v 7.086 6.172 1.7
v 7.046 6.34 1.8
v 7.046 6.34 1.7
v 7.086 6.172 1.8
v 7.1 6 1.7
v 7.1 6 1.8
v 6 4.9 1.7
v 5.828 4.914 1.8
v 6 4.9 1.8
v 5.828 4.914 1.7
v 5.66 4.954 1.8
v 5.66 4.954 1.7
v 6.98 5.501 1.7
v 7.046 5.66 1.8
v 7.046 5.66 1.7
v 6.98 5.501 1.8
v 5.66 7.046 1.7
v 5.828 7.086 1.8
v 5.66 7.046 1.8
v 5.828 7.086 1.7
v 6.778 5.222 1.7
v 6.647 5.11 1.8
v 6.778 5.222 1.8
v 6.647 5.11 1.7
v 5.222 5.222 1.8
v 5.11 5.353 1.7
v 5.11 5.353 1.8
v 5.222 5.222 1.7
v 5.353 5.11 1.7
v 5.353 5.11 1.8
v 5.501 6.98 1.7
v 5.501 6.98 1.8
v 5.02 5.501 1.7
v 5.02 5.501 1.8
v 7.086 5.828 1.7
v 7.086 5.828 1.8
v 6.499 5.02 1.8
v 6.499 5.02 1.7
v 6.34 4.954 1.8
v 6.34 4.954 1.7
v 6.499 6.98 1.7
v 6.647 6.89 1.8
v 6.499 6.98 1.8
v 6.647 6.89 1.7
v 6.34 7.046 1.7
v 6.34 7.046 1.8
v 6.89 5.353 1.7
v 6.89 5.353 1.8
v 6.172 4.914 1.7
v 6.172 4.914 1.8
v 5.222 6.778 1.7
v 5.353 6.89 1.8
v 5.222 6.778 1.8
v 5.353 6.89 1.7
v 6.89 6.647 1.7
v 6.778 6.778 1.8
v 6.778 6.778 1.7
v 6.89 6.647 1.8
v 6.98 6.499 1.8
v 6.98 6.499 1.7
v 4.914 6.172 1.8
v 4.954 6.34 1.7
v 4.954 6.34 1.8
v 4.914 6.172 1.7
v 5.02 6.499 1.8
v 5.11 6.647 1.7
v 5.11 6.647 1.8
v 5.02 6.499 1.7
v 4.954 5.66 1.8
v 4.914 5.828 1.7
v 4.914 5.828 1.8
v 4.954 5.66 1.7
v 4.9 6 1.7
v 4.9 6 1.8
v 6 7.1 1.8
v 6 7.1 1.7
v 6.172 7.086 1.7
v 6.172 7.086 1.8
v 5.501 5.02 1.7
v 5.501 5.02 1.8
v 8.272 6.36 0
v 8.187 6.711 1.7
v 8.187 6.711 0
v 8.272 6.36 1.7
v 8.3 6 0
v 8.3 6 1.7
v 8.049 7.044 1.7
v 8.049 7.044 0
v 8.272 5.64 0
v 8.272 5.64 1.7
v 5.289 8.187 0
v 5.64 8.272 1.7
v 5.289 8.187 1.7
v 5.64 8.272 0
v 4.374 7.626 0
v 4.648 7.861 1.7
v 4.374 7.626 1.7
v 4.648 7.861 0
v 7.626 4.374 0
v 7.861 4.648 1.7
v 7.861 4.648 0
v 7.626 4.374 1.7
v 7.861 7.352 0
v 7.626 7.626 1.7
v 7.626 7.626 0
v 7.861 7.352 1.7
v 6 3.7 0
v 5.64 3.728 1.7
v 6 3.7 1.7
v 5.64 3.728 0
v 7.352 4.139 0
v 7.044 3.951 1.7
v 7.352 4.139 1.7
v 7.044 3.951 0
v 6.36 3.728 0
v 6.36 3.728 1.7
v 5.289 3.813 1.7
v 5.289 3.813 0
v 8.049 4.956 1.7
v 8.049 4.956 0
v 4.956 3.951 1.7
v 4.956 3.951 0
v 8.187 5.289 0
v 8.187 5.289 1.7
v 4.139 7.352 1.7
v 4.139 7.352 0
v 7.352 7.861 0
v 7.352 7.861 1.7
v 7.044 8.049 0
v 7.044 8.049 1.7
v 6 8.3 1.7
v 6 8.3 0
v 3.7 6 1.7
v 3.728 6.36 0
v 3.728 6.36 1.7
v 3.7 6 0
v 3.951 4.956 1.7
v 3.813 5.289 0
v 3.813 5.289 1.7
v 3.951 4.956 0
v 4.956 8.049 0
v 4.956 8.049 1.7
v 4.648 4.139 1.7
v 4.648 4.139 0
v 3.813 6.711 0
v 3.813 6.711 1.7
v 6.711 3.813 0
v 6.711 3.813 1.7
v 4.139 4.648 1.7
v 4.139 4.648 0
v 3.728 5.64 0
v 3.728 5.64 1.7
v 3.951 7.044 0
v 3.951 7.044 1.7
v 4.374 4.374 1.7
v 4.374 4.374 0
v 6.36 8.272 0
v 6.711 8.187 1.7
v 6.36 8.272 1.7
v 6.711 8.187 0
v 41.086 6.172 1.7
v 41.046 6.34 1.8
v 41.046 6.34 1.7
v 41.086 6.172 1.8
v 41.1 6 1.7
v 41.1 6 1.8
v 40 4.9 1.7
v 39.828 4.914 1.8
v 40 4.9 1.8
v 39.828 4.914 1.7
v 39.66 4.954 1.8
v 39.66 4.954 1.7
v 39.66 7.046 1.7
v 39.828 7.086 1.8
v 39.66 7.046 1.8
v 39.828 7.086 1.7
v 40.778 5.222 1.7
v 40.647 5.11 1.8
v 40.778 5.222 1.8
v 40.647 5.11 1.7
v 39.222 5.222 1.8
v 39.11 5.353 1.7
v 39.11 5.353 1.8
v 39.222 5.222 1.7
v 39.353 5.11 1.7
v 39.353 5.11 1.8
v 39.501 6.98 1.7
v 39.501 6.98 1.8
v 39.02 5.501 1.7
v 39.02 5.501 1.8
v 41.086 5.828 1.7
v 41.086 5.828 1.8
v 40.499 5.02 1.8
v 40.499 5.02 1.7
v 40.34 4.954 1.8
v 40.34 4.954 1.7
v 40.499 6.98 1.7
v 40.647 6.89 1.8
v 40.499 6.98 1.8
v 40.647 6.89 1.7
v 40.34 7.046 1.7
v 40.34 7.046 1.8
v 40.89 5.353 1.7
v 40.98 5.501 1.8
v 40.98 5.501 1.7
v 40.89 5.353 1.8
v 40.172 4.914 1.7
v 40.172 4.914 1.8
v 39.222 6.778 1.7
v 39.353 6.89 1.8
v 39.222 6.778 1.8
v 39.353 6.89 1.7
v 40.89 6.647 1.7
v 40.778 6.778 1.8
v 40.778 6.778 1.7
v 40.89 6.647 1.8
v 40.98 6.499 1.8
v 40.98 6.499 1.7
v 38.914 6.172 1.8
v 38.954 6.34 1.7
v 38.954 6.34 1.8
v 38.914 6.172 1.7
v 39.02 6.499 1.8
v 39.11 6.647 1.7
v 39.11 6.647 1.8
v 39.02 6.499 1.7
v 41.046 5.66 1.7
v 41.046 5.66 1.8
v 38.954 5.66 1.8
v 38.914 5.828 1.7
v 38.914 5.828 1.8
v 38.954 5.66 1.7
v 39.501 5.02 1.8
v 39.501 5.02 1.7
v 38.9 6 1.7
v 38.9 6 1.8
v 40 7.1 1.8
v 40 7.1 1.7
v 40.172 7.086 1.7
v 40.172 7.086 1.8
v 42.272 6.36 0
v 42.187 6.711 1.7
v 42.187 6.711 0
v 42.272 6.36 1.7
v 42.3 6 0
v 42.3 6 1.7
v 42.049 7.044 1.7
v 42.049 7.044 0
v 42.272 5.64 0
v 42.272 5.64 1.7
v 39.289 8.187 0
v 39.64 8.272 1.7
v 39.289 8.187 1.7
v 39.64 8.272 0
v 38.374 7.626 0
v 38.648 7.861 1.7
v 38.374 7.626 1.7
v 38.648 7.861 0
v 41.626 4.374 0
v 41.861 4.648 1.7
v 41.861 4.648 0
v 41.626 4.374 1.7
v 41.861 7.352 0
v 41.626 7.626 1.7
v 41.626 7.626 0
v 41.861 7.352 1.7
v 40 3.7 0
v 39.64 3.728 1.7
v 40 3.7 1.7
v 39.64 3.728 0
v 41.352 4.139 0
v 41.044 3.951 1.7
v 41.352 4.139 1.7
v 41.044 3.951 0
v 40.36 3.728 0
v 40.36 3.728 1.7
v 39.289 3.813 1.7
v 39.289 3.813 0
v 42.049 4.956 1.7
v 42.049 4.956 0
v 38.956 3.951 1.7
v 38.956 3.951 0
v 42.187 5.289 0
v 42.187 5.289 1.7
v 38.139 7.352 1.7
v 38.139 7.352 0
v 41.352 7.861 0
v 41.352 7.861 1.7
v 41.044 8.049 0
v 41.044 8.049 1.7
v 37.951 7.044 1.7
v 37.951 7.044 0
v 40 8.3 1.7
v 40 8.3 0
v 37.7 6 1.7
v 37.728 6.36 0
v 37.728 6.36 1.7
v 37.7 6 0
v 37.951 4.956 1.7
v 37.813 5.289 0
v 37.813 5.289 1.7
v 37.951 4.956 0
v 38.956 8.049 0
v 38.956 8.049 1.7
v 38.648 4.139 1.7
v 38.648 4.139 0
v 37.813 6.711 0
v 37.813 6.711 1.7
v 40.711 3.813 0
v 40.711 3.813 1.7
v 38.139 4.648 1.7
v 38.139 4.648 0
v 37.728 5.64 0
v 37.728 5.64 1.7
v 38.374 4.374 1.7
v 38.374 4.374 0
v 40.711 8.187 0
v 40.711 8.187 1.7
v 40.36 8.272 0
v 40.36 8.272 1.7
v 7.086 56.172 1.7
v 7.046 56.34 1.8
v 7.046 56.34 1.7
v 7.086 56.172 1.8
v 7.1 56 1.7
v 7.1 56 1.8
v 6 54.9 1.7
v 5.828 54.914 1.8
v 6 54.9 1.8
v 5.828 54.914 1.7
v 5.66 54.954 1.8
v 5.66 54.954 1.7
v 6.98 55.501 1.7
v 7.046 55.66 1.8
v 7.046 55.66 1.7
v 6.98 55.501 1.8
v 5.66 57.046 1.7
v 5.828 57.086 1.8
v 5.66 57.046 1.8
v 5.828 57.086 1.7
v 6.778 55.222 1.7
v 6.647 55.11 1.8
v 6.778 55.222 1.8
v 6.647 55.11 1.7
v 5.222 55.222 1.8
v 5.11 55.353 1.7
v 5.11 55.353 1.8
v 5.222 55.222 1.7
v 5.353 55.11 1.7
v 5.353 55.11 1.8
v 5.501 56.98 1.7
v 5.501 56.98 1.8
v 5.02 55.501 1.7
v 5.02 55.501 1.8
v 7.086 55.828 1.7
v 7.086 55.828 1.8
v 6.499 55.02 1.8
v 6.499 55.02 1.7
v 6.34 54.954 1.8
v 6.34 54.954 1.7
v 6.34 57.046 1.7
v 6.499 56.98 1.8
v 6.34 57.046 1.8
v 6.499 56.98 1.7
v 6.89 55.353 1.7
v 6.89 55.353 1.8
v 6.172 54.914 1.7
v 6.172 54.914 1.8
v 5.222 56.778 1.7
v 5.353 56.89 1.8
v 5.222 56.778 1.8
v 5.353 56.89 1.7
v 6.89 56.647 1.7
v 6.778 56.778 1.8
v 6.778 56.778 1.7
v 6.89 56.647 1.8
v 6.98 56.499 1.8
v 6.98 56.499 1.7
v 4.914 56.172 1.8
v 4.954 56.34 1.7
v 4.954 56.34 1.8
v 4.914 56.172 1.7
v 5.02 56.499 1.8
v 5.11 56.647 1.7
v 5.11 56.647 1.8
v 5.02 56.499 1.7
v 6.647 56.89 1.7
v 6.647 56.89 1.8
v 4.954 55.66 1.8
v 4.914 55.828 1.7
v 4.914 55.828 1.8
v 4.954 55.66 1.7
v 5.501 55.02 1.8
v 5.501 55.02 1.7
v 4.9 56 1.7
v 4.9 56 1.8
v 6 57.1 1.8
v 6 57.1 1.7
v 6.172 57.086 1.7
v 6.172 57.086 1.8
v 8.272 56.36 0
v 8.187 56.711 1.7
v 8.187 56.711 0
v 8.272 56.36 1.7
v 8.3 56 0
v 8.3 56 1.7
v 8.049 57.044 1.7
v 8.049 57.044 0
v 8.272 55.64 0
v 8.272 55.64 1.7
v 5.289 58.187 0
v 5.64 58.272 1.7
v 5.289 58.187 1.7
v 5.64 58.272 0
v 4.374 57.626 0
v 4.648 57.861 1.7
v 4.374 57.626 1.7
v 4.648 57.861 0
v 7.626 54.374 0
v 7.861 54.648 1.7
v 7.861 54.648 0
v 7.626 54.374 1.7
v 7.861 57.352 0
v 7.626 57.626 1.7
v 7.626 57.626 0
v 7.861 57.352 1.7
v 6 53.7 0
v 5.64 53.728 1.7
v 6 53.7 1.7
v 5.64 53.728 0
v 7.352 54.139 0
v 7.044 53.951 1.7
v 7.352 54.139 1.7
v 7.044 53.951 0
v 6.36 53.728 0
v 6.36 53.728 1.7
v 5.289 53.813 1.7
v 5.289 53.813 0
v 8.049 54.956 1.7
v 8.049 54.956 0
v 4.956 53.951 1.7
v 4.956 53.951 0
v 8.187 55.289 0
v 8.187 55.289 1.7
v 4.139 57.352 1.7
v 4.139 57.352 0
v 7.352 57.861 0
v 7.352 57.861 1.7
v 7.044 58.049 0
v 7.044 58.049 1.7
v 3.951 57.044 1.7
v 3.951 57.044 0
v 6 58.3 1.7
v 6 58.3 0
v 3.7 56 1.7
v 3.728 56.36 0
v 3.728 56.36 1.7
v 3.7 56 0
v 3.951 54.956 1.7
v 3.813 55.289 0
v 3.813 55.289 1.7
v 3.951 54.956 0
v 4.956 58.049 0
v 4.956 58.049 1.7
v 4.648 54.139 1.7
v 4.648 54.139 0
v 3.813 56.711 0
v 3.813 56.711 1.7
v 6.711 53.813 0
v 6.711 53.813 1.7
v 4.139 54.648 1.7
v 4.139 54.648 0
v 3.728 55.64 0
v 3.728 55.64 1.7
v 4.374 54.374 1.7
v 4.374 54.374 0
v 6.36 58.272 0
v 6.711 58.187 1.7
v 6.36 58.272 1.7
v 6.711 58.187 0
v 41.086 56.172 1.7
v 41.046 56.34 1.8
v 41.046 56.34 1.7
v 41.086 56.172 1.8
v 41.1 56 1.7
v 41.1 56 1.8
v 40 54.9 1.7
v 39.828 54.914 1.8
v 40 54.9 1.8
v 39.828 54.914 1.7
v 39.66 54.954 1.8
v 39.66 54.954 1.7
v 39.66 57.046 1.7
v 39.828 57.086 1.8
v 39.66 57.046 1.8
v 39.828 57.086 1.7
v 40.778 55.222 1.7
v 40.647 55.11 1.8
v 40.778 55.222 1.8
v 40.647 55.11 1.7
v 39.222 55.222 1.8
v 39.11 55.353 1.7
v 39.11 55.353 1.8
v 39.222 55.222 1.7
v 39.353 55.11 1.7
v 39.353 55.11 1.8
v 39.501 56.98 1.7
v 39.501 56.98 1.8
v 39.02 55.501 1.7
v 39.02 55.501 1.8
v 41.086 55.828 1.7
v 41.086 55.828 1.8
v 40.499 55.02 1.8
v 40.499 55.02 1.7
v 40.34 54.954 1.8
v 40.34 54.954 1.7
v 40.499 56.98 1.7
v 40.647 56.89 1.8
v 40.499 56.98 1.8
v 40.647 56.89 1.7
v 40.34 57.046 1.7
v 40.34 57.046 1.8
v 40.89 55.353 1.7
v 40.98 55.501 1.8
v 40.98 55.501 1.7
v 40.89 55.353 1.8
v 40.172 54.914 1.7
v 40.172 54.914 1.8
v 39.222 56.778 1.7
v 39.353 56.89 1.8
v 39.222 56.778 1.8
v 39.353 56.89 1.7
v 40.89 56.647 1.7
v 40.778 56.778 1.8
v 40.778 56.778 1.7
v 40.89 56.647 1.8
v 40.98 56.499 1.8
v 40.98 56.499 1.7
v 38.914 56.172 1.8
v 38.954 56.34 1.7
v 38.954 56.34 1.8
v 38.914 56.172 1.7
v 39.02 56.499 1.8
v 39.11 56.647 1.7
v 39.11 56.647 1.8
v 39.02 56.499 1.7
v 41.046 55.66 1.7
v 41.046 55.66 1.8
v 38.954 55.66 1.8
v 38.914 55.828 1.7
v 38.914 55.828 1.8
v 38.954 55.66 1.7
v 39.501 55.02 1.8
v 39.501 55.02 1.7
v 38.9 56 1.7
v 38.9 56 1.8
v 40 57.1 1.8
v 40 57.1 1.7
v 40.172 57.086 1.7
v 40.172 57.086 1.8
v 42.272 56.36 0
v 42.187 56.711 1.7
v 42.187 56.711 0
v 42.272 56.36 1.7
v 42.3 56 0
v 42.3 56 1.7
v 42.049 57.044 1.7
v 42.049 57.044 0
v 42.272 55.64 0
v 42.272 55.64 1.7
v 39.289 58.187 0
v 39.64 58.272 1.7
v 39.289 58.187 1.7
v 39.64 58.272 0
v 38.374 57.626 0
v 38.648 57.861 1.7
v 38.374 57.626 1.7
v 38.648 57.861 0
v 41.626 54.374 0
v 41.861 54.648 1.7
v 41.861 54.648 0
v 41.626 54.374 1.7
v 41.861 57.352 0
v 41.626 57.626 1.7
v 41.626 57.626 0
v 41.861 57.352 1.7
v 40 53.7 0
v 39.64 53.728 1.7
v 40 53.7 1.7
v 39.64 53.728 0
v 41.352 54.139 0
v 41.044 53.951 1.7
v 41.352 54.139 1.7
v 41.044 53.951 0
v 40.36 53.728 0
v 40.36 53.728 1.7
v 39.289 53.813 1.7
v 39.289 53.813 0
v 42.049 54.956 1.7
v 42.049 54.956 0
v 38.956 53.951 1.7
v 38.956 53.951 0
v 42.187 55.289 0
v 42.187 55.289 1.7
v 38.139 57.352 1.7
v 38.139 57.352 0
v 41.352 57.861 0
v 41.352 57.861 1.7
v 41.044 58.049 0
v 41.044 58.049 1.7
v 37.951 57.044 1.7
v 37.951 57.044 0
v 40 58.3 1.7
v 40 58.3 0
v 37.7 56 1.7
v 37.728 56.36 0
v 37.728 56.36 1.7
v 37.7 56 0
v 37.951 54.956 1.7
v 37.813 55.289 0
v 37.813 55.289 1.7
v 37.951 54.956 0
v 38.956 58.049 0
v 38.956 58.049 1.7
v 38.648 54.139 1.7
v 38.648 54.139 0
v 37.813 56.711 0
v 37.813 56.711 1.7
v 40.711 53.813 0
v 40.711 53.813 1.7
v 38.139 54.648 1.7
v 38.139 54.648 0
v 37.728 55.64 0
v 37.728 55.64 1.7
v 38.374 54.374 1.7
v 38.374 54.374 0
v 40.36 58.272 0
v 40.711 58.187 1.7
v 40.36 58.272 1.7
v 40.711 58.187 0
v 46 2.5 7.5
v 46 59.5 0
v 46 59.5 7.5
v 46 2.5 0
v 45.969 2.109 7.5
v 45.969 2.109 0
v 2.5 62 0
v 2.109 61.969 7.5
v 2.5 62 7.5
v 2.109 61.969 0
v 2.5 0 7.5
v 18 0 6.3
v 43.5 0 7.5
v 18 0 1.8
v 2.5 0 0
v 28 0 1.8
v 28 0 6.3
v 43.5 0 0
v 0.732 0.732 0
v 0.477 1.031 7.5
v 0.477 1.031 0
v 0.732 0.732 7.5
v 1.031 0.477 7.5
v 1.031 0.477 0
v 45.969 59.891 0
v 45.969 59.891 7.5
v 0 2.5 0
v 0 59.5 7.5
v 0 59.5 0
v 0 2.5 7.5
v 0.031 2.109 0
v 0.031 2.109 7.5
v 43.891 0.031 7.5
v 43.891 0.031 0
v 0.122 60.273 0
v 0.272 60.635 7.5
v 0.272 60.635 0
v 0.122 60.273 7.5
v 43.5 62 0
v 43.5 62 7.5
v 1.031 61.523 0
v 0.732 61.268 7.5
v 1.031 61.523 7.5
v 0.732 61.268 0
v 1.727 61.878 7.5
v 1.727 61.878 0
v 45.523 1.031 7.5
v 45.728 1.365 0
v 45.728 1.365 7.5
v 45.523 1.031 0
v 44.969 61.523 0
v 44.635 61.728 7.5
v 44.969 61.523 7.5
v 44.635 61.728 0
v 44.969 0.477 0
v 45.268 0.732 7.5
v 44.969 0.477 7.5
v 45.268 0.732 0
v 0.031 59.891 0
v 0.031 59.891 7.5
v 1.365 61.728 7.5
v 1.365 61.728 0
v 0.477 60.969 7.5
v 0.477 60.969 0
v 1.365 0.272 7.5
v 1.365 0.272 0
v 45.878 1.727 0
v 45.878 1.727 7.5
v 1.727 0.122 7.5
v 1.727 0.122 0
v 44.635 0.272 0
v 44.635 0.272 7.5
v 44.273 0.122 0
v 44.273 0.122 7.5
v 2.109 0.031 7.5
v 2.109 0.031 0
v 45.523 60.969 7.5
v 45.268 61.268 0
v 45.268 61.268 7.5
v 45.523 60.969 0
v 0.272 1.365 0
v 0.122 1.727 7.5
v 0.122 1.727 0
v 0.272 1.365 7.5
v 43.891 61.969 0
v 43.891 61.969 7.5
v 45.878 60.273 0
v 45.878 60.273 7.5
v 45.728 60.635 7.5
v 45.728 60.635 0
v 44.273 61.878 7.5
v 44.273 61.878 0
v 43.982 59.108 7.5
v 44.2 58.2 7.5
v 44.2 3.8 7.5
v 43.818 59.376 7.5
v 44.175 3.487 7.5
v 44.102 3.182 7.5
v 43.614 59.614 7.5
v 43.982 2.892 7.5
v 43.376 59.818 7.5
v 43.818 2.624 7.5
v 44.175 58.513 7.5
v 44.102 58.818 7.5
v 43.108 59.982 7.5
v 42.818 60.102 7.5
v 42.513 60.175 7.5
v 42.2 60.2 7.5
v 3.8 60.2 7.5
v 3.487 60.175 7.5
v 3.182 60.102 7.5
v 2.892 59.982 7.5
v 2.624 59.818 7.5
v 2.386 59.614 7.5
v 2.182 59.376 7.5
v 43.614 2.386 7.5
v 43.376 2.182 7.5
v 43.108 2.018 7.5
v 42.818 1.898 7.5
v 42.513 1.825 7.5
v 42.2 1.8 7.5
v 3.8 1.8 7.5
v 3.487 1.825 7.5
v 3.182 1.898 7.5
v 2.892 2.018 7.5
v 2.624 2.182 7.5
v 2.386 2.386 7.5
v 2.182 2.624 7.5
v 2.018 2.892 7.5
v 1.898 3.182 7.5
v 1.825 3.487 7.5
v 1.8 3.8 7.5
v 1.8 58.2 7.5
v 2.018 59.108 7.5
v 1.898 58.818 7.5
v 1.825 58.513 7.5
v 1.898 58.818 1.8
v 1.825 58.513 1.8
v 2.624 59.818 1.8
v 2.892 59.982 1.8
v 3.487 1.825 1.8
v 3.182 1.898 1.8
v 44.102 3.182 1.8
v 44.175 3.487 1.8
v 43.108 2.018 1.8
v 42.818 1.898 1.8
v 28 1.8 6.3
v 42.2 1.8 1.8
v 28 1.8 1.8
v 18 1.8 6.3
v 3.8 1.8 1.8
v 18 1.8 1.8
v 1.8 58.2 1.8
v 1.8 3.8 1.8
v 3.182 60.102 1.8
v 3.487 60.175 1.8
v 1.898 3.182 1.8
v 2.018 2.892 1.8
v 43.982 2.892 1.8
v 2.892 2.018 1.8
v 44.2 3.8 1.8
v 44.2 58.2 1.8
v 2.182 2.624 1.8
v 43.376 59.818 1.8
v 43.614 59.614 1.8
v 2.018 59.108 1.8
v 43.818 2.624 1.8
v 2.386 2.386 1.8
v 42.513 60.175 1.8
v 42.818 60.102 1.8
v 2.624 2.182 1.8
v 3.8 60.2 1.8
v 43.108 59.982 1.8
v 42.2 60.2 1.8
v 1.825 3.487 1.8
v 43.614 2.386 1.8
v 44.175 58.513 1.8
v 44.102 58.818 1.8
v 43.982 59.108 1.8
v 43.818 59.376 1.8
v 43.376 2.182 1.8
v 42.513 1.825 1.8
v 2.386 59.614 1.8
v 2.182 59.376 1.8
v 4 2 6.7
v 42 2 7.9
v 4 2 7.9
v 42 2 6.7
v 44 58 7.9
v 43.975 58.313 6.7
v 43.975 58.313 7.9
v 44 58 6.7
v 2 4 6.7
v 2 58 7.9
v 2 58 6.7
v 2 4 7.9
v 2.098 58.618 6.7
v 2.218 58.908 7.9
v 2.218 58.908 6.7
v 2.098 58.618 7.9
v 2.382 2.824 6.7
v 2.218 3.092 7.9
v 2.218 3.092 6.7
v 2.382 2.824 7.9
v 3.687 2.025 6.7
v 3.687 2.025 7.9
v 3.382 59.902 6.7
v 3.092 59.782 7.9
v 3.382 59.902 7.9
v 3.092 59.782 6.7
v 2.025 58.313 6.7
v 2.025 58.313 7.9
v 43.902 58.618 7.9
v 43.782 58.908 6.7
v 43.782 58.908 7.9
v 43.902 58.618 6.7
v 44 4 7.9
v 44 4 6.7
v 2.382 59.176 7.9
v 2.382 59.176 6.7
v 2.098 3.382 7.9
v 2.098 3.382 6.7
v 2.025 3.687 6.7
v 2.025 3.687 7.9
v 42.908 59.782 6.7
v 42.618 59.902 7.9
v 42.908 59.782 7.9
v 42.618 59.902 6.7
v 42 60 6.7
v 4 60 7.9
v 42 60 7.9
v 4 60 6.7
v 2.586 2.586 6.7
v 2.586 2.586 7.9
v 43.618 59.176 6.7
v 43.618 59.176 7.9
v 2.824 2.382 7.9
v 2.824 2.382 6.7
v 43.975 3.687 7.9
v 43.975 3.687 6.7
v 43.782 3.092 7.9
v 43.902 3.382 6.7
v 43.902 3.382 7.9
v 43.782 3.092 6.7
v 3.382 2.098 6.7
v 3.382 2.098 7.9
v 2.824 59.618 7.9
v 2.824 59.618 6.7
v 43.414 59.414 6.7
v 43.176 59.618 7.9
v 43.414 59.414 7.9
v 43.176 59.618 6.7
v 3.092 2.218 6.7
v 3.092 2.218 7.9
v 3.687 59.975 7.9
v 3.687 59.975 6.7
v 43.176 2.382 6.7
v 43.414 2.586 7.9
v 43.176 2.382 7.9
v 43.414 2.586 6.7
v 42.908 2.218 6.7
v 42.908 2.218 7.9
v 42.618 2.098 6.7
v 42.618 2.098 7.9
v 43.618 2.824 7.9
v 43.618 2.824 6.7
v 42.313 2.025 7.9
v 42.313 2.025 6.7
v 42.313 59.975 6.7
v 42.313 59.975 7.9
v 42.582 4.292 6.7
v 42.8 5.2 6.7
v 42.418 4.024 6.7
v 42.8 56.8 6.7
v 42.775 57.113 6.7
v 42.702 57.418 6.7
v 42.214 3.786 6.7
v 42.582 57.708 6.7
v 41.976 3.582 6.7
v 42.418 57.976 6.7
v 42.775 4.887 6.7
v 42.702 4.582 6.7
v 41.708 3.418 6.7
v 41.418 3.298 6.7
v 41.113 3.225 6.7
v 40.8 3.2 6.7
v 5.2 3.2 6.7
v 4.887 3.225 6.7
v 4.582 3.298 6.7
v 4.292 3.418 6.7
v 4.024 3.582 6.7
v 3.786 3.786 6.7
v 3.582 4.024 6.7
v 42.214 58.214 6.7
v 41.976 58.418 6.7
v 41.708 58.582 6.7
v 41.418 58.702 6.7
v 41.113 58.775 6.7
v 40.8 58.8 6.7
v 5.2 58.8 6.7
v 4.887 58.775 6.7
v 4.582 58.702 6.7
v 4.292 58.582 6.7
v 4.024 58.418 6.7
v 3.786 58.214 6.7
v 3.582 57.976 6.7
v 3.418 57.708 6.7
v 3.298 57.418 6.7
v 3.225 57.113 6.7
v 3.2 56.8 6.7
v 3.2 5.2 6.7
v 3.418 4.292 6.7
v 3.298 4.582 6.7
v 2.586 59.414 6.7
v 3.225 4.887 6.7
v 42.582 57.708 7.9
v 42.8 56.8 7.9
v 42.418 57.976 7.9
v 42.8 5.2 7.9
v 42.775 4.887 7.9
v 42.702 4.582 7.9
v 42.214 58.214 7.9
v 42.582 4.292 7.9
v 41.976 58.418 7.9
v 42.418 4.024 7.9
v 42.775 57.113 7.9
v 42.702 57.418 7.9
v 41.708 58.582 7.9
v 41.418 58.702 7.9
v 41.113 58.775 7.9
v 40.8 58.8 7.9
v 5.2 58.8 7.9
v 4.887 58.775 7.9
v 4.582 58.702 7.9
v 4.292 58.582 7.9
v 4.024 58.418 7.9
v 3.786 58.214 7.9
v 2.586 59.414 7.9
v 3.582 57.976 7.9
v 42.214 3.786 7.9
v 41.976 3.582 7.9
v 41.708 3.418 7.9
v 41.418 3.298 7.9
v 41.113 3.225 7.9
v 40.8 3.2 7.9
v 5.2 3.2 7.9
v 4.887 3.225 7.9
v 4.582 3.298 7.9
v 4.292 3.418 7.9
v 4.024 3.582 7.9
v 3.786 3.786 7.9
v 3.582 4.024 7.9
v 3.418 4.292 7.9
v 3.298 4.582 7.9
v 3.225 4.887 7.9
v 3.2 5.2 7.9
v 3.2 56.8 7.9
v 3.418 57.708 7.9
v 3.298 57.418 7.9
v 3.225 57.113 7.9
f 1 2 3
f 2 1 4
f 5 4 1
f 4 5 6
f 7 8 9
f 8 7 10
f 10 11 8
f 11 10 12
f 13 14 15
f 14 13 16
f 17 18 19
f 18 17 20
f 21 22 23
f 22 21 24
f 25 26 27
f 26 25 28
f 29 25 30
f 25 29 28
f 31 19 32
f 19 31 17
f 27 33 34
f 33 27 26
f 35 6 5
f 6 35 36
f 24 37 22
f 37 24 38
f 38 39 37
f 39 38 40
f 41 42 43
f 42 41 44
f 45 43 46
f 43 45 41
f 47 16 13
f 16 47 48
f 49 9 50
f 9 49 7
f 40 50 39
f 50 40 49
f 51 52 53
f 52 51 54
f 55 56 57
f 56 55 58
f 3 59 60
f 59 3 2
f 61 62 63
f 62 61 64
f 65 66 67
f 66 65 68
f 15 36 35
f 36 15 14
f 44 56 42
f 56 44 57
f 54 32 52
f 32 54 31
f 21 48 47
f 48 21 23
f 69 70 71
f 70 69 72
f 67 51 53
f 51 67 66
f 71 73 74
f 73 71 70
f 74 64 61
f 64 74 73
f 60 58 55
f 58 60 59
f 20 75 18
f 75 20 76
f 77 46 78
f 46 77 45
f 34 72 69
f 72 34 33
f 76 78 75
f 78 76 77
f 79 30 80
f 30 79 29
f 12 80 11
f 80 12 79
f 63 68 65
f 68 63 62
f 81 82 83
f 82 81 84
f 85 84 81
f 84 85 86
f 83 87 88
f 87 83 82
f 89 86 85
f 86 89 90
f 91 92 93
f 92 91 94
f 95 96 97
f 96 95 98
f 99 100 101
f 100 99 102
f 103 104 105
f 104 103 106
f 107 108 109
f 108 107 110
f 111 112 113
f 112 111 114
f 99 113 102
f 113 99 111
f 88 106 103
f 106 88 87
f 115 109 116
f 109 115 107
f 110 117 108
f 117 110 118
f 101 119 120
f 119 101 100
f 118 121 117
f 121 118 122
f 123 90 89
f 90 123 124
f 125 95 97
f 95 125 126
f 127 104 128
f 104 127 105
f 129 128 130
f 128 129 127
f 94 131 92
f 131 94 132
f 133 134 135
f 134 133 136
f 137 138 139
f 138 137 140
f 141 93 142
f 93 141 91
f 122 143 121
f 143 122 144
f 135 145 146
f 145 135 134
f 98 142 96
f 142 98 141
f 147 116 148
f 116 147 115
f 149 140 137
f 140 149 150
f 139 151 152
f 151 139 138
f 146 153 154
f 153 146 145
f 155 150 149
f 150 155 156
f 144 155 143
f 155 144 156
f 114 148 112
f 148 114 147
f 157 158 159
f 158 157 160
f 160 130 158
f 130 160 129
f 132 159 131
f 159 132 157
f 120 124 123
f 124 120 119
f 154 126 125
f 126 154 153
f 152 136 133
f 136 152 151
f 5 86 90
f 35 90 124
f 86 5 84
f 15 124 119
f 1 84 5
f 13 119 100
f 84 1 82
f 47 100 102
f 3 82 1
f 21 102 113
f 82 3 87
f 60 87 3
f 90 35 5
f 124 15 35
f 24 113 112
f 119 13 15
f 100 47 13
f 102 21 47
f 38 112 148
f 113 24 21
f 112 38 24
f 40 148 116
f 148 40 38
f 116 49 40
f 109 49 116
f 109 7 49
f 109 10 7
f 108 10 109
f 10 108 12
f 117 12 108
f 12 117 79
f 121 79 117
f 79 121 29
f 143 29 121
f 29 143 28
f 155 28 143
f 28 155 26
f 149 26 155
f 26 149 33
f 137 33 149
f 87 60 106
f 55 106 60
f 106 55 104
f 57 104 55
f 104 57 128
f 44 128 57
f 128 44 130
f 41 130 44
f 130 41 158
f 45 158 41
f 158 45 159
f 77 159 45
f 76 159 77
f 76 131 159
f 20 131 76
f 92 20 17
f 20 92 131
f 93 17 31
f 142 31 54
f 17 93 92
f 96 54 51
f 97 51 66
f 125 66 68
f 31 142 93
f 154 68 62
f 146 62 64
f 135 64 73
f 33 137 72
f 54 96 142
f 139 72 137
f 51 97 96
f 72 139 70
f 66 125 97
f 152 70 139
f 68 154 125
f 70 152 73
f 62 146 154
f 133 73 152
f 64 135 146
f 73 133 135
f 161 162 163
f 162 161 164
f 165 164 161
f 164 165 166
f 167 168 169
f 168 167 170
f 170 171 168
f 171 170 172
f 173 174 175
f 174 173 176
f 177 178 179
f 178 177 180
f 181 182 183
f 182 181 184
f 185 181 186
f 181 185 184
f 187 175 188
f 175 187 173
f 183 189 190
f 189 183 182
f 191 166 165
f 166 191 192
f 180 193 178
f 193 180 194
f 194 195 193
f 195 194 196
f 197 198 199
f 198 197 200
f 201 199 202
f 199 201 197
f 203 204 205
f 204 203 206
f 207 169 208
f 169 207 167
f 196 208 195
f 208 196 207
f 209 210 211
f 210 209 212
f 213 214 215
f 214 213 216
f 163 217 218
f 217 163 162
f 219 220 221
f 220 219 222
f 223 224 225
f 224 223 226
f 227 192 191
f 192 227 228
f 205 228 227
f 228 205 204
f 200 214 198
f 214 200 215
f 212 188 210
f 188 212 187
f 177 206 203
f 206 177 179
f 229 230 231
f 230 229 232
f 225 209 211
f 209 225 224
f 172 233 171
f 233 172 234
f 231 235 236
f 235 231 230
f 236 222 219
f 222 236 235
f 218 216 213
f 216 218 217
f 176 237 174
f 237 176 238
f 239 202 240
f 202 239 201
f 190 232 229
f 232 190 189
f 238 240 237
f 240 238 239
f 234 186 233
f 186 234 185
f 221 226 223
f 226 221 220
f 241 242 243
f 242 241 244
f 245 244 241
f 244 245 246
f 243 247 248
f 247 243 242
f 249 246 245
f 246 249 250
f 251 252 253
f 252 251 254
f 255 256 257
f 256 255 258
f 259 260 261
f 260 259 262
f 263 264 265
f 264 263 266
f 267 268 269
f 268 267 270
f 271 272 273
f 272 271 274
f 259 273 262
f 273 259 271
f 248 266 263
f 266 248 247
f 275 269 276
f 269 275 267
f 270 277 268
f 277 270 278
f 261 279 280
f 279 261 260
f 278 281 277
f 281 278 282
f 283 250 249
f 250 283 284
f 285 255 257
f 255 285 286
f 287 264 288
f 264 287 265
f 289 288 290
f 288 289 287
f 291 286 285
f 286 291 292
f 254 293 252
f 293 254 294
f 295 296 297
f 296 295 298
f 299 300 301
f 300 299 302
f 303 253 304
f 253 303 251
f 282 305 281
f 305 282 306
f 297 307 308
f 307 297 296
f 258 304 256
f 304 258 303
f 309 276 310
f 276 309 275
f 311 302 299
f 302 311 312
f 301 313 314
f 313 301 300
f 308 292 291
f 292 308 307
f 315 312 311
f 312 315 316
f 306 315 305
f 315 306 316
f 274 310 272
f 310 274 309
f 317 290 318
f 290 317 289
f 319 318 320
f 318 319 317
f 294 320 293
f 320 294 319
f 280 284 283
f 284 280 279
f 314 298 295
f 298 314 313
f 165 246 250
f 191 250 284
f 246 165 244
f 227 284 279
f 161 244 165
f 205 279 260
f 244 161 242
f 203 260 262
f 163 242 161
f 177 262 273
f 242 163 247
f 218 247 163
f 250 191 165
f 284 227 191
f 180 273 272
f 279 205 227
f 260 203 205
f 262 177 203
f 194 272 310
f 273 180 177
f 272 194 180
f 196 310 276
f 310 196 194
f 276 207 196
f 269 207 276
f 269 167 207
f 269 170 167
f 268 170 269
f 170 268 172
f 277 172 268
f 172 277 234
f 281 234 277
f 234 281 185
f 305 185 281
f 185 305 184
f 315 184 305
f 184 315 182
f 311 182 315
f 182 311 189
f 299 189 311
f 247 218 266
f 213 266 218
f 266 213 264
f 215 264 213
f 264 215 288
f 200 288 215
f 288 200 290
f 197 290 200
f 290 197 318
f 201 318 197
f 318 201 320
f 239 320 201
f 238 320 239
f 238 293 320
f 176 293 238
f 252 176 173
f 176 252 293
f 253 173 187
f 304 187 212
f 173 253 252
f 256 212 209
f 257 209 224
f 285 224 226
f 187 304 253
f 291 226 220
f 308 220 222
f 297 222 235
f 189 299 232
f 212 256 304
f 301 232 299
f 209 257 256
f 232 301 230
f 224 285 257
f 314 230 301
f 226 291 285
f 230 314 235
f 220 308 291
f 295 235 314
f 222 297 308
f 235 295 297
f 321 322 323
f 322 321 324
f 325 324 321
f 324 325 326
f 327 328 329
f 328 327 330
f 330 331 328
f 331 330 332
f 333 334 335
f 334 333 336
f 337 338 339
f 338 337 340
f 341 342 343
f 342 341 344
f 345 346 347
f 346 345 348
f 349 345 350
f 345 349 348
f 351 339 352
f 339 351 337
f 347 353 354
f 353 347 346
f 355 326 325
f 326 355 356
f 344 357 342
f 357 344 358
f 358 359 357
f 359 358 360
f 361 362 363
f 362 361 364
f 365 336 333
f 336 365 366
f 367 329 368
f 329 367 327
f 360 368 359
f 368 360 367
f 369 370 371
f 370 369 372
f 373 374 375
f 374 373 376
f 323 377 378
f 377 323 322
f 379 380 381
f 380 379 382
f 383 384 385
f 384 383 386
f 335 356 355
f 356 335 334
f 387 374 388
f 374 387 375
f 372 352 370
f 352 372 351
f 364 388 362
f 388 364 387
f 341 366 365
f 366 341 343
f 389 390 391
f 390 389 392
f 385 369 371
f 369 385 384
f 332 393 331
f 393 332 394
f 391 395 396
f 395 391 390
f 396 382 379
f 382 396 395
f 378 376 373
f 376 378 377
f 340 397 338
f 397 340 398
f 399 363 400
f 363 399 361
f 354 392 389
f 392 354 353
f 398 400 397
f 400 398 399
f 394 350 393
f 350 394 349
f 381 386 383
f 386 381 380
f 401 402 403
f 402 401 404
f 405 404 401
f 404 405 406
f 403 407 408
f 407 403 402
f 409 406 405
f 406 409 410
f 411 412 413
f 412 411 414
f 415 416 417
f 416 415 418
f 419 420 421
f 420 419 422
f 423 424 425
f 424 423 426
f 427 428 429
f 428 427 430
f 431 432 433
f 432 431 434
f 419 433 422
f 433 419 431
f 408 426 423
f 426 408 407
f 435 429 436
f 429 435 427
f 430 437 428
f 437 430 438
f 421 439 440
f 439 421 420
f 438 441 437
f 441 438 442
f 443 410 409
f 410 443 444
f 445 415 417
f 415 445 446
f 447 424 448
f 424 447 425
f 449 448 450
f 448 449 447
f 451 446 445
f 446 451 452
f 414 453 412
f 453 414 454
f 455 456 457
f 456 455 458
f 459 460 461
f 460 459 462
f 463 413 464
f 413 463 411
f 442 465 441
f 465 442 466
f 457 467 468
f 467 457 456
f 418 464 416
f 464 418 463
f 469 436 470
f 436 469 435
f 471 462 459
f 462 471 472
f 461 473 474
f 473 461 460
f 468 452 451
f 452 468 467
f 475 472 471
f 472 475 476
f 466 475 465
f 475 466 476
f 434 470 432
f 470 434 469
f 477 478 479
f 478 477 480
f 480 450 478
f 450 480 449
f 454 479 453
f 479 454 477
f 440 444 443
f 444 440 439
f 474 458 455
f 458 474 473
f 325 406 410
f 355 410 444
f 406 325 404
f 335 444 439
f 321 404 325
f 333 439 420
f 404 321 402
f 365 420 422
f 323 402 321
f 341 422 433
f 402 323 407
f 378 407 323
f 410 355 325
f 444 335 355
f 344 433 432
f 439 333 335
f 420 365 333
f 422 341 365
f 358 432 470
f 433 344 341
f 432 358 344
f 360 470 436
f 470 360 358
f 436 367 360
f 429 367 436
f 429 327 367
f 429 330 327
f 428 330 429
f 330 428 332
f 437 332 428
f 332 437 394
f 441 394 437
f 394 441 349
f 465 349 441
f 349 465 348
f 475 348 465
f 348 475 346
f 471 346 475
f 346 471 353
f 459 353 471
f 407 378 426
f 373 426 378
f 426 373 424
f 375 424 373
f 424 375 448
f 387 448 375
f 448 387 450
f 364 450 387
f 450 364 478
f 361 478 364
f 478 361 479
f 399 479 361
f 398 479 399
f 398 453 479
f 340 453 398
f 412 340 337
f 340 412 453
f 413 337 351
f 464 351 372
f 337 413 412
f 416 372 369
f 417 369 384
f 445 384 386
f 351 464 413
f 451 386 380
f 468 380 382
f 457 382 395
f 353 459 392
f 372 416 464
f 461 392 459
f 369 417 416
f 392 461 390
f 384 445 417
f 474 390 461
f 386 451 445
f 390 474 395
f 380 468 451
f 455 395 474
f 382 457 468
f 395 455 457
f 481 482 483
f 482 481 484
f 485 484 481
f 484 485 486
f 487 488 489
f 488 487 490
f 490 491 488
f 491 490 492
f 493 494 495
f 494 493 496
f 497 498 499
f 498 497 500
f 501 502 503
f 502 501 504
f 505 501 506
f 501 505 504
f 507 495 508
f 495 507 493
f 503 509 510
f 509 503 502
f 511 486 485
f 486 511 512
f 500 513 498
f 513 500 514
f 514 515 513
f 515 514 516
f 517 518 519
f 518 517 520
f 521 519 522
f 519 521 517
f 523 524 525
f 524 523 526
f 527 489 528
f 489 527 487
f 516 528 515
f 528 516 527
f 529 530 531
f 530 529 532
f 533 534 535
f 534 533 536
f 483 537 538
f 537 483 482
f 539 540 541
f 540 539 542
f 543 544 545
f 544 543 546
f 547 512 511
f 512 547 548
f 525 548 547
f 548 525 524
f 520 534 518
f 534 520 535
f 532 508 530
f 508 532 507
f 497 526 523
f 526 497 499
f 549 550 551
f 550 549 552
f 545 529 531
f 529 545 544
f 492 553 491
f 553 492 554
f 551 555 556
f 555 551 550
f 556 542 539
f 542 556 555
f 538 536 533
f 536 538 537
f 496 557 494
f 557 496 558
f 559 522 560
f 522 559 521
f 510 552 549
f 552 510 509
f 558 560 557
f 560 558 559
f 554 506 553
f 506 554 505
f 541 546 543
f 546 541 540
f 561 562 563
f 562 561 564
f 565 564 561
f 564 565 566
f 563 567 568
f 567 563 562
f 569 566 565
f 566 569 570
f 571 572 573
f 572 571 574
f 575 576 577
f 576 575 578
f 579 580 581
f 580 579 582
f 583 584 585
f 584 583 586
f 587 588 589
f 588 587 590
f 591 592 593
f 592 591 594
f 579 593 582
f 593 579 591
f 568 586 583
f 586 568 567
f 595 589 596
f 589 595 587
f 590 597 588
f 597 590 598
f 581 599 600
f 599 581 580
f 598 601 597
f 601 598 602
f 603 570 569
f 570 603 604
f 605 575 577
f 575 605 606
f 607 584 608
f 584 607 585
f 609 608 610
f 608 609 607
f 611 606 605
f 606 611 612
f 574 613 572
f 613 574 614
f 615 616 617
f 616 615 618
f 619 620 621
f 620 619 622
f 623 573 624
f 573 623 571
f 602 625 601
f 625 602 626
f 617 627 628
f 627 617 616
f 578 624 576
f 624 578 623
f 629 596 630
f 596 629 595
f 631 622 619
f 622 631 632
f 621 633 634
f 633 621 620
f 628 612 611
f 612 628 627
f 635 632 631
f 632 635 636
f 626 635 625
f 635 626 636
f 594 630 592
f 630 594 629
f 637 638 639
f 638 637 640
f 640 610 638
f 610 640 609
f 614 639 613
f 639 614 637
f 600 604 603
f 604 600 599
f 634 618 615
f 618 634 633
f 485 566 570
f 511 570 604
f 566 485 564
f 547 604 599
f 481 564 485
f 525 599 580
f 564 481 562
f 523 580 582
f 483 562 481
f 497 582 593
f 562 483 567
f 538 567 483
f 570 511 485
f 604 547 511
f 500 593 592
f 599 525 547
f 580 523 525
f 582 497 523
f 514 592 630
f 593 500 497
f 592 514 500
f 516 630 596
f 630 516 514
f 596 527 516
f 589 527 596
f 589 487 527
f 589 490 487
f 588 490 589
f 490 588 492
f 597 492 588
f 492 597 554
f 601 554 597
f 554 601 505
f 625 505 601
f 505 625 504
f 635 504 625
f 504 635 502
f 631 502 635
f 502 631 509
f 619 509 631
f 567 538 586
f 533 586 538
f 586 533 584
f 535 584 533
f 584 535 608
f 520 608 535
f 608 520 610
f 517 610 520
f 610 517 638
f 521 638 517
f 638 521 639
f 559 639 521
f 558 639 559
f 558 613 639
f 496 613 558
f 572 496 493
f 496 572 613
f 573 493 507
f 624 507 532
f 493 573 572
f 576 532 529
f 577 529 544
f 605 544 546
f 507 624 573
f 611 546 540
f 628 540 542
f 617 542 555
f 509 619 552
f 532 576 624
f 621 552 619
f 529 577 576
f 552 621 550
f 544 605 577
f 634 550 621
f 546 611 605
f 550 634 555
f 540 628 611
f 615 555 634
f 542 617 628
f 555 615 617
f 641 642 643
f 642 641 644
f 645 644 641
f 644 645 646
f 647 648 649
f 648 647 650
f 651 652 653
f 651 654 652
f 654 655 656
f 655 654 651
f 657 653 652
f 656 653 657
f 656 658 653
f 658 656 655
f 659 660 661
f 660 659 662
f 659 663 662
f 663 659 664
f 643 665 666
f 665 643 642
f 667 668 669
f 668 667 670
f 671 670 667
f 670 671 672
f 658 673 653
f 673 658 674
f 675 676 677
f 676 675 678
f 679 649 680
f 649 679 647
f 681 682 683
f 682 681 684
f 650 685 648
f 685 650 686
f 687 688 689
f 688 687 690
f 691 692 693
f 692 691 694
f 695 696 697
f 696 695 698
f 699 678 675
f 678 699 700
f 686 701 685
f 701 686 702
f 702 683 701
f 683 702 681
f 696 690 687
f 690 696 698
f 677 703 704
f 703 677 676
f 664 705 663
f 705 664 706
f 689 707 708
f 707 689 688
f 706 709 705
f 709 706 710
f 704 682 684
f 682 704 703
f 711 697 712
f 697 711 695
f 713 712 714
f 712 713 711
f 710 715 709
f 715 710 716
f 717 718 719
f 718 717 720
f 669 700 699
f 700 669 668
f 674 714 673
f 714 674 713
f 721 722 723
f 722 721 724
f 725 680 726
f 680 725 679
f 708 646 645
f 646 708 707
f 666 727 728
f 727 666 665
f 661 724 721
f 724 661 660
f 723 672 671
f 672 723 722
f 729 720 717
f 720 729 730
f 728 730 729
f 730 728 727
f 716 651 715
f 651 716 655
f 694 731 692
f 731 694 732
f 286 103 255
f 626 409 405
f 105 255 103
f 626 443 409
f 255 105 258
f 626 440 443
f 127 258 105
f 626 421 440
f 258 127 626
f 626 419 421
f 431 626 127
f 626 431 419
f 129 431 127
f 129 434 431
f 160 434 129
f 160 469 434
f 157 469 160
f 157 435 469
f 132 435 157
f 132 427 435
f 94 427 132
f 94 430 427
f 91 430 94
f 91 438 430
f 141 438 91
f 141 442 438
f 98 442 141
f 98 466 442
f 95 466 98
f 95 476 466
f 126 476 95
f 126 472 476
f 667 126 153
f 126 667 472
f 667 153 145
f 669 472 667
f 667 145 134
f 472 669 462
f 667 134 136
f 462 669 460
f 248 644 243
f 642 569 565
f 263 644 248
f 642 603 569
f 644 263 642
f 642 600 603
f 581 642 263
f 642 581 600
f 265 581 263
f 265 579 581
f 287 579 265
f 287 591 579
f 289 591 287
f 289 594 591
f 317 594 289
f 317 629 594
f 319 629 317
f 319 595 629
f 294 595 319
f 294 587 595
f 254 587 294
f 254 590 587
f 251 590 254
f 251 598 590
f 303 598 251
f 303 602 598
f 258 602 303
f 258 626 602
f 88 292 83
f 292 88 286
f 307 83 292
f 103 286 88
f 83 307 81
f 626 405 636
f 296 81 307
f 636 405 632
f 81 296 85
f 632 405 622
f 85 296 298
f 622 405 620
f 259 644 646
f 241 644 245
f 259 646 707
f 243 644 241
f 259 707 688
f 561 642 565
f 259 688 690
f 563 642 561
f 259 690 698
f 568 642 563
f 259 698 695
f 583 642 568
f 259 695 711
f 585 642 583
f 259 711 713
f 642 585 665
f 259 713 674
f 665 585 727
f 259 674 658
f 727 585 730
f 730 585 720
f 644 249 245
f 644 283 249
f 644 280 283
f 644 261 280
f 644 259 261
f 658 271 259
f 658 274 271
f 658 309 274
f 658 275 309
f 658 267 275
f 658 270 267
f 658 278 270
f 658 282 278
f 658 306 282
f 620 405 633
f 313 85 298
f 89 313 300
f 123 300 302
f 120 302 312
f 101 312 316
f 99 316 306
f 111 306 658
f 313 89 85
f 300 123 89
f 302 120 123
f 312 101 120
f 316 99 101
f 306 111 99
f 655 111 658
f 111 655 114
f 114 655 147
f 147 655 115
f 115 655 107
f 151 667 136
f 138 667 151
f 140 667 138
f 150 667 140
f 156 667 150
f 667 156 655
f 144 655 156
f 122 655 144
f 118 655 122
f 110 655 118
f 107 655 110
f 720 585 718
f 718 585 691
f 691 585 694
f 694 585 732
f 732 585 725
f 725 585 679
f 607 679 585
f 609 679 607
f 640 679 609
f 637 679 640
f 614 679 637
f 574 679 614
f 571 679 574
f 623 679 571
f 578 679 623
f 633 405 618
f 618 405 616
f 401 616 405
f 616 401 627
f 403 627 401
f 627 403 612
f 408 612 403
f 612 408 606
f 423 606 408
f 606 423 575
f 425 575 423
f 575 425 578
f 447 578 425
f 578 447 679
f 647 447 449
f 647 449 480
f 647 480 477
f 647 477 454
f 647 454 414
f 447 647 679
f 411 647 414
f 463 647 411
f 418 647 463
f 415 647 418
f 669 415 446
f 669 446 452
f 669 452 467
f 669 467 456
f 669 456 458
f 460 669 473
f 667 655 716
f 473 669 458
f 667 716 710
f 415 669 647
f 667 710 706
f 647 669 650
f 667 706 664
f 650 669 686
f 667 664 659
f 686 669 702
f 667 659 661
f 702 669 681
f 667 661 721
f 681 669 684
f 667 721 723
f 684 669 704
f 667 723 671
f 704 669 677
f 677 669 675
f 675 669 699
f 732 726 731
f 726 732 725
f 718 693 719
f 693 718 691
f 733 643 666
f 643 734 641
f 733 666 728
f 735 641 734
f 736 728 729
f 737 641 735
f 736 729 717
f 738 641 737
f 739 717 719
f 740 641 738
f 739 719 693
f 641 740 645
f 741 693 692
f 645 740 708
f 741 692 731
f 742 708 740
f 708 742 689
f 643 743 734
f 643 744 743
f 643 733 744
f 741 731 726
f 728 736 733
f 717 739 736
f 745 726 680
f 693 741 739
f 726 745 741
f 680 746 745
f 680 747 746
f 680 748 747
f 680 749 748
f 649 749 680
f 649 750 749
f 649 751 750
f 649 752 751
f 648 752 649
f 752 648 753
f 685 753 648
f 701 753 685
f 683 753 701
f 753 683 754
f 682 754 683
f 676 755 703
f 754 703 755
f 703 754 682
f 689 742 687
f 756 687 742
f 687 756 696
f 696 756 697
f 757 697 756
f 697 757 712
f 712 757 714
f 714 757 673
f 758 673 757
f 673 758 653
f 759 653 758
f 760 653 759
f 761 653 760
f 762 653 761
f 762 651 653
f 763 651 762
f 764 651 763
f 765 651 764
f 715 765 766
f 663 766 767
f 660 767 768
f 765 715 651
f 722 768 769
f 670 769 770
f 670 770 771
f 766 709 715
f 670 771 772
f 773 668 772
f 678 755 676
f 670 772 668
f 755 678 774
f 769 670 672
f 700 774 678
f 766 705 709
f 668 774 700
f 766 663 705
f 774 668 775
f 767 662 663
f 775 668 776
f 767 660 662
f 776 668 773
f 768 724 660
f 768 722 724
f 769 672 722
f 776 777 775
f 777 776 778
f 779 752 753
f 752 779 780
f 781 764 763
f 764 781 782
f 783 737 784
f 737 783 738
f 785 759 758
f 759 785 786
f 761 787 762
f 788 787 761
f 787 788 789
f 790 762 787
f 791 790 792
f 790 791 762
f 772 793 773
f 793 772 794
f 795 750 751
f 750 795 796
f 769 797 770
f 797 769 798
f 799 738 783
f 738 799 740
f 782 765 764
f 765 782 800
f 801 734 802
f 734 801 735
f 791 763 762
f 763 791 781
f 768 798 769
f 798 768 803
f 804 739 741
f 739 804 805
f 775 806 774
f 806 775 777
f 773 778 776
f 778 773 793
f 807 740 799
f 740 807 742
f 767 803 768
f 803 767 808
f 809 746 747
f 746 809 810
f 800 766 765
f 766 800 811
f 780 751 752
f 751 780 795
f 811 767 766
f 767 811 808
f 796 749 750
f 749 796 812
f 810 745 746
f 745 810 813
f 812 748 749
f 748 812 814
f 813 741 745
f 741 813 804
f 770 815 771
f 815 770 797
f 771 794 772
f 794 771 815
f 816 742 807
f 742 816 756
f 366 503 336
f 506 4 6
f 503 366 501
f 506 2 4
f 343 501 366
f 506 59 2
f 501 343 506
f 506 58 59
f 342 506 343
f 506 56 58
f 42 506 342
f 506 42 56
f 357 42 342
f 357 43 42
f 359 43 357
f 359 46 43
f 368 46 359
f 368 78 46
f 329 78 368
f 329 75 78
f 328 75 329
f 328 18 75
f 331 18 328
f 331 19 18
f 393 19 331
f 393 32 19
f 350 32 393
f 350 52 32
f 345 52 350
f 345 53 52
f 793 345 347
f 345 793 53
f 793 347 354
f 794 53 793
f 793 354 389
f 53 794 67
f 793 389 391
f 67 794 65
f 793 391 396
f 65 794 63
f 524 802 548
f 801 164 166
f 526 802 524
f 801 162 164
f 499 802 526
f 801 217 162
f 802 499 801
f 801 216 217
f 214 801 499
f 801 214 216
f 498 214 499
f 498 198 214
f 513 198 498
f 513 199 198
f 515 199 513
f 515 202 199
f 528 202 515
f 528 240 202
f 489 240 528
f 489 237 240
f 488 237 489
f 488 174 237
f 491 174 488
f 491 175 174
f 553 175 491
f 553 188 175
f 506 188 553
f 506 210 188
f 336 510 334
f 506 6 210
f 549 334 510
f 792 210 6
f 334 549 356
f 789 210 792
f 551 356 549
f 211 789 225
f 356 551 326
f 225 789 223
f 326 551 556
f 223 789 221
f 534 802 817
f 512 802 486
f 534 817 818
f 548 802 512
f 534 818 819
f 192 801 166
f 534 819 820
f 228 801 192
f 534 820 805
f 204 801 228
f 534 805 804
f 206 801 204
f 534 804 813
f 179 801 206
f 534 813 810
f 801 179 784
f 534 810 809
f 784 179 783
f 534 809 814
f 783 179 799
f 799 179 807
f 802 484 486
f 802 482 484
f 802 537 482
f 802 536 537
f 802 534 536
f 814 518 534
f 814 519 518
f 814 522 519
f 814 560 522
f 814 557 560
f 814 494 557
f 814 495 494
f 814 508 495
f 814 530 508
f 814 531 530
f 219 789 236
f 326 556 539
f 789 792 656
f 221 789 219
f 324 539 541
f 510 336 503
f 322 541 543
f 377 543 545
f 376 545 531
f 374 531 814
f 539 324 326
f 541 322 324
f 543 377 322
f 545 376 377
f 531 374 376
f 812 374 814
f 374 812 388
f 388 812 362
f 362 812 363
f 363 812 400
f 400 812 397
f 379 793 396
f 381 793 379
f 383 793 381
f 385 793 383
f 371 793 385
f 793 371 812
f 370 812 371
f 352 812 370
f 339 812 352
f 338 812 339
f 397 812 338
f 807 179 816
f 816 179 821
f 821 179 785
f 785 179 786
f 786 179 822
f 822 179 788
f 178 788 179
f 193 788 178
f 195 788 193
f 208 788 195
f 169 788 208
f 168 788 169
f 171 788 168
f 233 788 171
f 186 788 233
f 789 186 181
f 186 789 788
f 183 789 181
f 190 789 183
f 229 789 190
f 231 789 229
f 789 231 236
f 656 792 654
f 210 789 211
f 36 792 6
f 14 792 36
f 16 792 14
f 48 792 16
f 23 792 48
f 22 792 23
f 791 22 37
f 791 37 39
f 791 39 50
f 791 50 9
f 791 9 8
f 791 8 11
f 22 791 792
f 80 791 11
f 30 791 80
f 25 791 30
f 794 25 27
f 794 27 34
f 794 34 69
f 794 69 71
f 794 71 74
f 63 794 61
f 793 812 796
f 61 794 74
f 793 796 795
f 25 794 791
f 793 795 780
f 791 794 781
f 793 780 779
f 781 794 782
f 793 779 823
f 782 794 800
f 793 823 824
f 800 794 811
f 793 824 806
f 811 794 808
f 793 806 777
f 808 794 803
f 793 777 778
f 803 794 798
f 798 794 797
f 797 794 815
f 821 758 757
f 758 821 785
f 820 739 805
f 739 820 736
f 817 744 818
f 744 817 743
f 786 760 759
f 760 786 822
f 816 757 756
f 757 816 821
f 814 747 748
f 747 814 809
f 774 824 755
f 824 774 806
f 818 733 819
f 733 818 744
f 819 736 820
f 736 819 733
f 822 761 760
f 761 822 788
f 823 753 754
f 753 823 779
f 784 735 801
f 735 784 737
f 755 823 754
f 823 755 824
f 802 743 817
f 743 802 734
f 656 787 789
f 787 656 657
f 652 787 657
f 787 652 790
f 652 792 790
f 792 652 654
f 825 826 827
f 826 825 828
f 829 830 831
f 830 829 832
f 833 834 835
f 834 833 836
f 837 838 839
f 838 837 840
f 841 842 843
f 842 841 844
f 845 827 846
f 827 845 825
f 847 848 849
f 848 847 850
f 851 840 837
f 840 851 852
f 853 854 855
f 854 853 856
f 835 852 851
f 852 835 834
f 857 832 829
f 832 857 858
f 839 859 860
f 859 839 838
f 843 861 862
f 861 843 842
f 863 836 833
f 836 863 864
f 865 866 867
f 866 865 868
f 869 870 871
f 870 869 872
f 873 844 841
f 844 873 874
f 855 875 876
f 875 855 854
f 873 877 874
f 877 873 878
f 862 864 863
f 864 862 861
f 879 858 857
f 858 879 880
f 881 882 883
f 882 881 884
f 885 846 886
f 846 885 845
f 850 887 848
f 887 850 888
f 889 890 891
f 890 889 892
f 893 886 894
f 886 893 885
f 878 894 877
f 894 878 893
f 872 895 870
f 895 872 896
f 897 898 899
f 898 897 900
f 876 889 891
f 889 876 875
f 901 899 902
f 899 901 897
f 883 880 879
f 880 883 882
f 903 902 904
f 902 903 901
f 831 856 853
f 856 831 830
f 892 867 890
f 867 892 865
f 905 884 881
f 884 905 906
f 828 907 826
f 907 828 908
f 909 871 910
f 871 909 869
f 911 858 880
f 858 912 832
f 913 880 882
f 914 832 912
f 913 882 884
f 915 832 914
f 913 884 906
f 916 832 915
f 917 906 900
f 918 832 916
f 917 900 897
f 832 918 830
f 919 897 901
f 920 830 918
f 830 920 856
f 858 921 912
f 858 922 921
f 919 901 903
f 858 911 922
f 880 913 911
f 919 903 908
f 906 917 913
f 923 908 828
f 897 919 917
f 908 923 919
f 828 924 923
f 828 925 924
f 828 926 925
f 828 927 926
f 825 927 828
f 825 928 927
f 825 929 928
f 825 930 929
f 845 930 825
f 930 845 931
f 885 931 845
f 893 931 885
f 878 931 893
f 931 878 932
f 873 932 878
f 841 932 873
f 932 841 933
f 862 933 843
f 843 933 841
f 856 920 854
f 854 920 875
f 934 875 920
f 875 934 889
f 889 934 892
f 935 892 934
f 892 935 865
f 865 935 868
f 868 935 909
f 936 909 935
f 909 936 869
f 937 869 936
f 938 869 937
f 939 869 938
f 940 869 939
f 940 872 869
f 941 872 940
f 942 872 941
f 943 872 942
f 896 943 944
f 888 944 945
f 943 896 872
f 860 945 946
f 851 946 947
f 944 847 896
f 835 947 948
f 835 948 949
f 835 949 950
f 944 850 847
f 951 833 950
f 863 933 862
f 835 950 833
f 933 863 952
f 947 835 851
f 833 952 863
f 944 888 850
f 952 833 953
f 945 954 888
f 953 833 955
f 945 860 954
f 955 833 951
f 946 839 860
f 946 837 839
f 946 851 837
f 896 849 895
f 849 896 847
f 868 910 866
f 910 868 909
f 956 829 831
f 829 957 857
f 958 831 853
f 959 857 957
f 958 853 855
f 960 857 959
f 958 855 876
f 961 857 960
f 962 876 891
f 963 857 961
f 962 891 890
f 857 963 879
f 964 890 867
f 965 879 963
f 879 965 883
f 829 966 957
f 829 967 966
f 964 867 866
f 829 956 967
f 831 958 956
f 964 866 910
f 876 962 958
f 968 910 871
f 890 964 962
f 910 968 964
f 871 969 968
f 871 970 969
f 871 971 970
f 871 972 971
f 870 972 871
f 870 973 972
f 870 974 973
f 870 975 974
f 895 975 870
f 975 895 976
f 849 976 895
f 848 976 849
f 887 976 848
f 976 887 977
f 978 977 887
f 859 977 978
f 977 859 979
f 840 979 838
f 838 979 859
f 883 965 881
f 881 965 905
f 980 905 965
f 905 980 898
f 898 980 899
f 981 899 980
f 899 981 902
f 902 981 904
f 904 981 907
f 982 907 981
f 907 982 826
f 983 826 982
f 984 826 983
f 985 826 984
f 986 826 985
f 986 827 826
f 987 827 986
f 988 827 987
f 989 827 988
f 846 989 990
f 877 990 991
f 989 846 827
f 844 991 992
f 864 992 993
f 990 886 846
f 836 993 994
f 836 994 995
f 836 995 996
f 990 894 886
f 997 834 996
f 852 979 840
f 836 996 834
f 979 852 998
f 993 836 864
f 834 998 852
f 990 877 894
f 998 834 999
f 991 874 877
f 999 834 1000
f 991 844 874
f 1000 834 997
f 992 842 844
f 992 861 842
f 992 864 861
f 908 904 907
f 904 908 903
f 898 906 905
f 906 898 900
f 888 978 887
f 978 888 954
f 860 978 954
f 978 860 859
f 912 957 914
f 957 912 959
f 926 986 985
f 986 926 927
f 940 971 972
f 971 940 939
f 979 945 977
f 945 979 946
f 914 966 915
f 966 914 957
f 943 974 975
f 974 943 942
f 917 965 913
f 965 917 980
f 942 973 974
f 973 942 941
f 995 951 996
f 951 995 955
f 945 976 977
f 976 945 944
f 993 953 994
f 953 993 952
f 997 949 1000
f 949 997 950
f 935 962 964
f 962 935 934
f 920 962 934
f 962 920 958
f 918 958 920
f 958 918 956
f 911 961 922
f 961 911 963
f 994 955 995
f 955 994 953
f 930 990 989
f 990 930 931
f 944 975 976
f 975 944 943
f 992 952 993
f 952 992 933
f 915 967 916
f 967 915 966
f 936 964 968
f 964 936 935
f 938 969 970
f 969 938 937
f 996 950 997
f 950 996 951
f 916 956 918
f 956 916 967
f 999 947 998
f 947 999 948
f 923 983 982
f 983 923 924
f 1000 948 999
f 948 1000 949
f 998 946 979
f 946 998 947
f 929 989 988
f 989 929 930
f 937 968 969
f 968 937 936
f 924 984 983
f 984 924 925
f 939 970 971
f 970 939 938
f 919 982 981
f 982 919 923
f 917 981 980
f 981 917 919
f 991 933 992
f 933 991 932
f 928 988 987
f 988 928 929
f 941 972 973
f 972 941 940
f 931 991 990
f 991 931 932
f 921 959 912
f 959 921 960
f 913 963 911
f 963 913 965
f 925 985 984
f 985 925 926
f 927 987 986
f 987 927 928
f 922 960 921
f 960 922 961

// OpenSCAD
// file: parameters.scad
// =============================================================================
// Snake Dongle Case – Shared Parameters
// Compatible with:
//   • Pro Micro nRF52840 / Nice Nano v2 controller
//   • 1.54" TFT 240×240 ST7789 display  (PCB: 35 mm × 38 mm, window: 28 mm × 28 mm)
//   • 2× 6×6×8 mm tactile push buttons
//   • LDR light-sensor module           (replaces the buzzer, ~8 mm × 12 mm)
//   • M2 heat-set brass inserts + M2 screws
// =============================================================================

// ── General print tolerances ───────────────────────────────────────────────
$fn = 40;
tol = 0.2;          // fit tolerance between mating parts

// ── Wall & structure ───────────────────────────────────────────────────────
wall   = 1.8;       // shell wall thickness (mm)
floor  = 1.8;       // top / bottom face thickness (mm)
corner = 2.5;       // outer corner radius

// ── Overall case envelope ─────────────────────────────────────────────────
case_w = 46;        // width  (X)
case_h = 62;        // height (Y)
case_d = 15;        // total depth (Z) – split equally between top and bottom half

// ── Display (1.54" TFT, ST7789) ───────────────────────────────────────────
disp_pcb_w  = 35;
disp_pcb_h  = 38;
disp_win_w  = 28;   // visible display window width
disp_win_h  = 28;   // visible display window height
// Top-left corner of the display PCB pocket, measured from the front-face origin
disp_off_x  = (case_w - disp_pcb_w) / 2;
disp_off_y  = 5;
// Window centred on the PCB
disp_win_x  = disp_off_x + (disp_pcb_w - disp_win_w) / 2;
disp_win_y  = disp_off_y + (disp_pcb_h - disp_win_h) / 2;

// ── Buttons (6×6 tactile) ─────────────────────────────────────────────────
btn_d  = 6.6;       // through-hole diameter for button cap
btn1_x = 11;        // menu / reset button – left
btn1_y = case_h - 13;
btn2_x = case_w - 11; // action button – right
btn2_y = btn1_y;

// ── Light sensor (LDR module, replaces buzzer) ────────────────────────────
// Module dimensions: ~12 mm × 8 mm; exposed sensor window: 7 mm × 4 mm
sensor_slot_w = 9;   // opening width
sensor_slot_h = 5;   // opening height
// Centred between display and bottom edge
sensor_slot_x = (case_w - sensor_slot_w) / 2;
sensor_slot_y = disp_off_y + disp_pcb_h + 4;

// ── USB connector (USB-C, on the nRF52840 controller) ─────────────────────
usb_w  = 10;
usb_h  = 4.5;
usb_x  = (case_w - usb_w) / 2;

// ── Fasteners (M2 heat-set inserts) ───────────────────────────────────────
insert_od  = 3.2;   // heat-set insert outer diameter
insert_len = 3.0;   // insert height
screw_d    = 2.2;   // M2 clearance hole diameter
boss_od    = insert_od + 2 * wall;  // boss outer diameter

// Screw-boss centres (one at each corner)
screw_pos = [
    [6,         6        ],
    [case_w-6,  6        ],
    [6,         case_h-6 ],
    [case_w-6,  case_h-6 ],
];
// main file
// =============================================================================
// Snake Dongle Case – Bottom Shell
// Includes: USB cut-out, controller pocket, screw bosses with counter-bores
// =============================================================================
include <parameters.scad>

half = case_d / 2;

// ── Helper: rounded rectangular prism ────────────────────────────────────
module rrect(w, h, r, d) {
    hull()
        for (x = [r, w-r], y = [r, h-r])
            translate([x, y, 0]) cylinder(r=r, h=d);
}

// ── Main bottom-shell module ──────────────────────────────────────────────
module bottom_shell() {
    difference() {

        // ── Outer body ────────────────────────────────────────────────────
        rrect(case_w, case_h, corner, half);

        // ── Inner cavity ──────────────────────────────────────────────────
        translate([wall, wall, floor])
            rrect(case_w - 2*wall, case_h - 2*wall, corner - 0.5,
                  half - floor + 0.01);

        // ── USB-C cut-out (positioned at the bottom edge, centred) ────────
        // The nRF52840 USB connector faces the bottom edge of the case.
        translate([usb_x, -0.1, floor])
            cube([usb_w, wall + 0.2, usb_h]);

        // ── Screw through-holes + counter-bore for screw head ─────────────
        for (p = screw_pos) {
            translate([p[0], p[1], -0.1])
                cylinder(d=screw_d, h=half + 0.2);           // clearance hole
            translate([p[0], p[1], -0.1])
                cylinder(d=screw_d + 2.4, h=1.8);            // counter-bore
        }
    }

    // ── Alignment rim that mates with the top shell ───────────────────────
    // A thin lip around the perimeter so both halves register to each other.
    translate([wall + tol, wall + tol, half - 0.8])
        difference() {
            rrect(case_w - 2*(wall+tol),
                  case_h - 2*(wall+tol),
                  corner - 0.5, 1.2);
            translate([1.2, 1.2, -0.1])
                rrect(case_w - 2*(wall+tol) - 2.4,
                      case_h - 2*(wall+tol) - 2.4,
                      corner - 0.5, 1.4);
        }
}

bottom_shell();
